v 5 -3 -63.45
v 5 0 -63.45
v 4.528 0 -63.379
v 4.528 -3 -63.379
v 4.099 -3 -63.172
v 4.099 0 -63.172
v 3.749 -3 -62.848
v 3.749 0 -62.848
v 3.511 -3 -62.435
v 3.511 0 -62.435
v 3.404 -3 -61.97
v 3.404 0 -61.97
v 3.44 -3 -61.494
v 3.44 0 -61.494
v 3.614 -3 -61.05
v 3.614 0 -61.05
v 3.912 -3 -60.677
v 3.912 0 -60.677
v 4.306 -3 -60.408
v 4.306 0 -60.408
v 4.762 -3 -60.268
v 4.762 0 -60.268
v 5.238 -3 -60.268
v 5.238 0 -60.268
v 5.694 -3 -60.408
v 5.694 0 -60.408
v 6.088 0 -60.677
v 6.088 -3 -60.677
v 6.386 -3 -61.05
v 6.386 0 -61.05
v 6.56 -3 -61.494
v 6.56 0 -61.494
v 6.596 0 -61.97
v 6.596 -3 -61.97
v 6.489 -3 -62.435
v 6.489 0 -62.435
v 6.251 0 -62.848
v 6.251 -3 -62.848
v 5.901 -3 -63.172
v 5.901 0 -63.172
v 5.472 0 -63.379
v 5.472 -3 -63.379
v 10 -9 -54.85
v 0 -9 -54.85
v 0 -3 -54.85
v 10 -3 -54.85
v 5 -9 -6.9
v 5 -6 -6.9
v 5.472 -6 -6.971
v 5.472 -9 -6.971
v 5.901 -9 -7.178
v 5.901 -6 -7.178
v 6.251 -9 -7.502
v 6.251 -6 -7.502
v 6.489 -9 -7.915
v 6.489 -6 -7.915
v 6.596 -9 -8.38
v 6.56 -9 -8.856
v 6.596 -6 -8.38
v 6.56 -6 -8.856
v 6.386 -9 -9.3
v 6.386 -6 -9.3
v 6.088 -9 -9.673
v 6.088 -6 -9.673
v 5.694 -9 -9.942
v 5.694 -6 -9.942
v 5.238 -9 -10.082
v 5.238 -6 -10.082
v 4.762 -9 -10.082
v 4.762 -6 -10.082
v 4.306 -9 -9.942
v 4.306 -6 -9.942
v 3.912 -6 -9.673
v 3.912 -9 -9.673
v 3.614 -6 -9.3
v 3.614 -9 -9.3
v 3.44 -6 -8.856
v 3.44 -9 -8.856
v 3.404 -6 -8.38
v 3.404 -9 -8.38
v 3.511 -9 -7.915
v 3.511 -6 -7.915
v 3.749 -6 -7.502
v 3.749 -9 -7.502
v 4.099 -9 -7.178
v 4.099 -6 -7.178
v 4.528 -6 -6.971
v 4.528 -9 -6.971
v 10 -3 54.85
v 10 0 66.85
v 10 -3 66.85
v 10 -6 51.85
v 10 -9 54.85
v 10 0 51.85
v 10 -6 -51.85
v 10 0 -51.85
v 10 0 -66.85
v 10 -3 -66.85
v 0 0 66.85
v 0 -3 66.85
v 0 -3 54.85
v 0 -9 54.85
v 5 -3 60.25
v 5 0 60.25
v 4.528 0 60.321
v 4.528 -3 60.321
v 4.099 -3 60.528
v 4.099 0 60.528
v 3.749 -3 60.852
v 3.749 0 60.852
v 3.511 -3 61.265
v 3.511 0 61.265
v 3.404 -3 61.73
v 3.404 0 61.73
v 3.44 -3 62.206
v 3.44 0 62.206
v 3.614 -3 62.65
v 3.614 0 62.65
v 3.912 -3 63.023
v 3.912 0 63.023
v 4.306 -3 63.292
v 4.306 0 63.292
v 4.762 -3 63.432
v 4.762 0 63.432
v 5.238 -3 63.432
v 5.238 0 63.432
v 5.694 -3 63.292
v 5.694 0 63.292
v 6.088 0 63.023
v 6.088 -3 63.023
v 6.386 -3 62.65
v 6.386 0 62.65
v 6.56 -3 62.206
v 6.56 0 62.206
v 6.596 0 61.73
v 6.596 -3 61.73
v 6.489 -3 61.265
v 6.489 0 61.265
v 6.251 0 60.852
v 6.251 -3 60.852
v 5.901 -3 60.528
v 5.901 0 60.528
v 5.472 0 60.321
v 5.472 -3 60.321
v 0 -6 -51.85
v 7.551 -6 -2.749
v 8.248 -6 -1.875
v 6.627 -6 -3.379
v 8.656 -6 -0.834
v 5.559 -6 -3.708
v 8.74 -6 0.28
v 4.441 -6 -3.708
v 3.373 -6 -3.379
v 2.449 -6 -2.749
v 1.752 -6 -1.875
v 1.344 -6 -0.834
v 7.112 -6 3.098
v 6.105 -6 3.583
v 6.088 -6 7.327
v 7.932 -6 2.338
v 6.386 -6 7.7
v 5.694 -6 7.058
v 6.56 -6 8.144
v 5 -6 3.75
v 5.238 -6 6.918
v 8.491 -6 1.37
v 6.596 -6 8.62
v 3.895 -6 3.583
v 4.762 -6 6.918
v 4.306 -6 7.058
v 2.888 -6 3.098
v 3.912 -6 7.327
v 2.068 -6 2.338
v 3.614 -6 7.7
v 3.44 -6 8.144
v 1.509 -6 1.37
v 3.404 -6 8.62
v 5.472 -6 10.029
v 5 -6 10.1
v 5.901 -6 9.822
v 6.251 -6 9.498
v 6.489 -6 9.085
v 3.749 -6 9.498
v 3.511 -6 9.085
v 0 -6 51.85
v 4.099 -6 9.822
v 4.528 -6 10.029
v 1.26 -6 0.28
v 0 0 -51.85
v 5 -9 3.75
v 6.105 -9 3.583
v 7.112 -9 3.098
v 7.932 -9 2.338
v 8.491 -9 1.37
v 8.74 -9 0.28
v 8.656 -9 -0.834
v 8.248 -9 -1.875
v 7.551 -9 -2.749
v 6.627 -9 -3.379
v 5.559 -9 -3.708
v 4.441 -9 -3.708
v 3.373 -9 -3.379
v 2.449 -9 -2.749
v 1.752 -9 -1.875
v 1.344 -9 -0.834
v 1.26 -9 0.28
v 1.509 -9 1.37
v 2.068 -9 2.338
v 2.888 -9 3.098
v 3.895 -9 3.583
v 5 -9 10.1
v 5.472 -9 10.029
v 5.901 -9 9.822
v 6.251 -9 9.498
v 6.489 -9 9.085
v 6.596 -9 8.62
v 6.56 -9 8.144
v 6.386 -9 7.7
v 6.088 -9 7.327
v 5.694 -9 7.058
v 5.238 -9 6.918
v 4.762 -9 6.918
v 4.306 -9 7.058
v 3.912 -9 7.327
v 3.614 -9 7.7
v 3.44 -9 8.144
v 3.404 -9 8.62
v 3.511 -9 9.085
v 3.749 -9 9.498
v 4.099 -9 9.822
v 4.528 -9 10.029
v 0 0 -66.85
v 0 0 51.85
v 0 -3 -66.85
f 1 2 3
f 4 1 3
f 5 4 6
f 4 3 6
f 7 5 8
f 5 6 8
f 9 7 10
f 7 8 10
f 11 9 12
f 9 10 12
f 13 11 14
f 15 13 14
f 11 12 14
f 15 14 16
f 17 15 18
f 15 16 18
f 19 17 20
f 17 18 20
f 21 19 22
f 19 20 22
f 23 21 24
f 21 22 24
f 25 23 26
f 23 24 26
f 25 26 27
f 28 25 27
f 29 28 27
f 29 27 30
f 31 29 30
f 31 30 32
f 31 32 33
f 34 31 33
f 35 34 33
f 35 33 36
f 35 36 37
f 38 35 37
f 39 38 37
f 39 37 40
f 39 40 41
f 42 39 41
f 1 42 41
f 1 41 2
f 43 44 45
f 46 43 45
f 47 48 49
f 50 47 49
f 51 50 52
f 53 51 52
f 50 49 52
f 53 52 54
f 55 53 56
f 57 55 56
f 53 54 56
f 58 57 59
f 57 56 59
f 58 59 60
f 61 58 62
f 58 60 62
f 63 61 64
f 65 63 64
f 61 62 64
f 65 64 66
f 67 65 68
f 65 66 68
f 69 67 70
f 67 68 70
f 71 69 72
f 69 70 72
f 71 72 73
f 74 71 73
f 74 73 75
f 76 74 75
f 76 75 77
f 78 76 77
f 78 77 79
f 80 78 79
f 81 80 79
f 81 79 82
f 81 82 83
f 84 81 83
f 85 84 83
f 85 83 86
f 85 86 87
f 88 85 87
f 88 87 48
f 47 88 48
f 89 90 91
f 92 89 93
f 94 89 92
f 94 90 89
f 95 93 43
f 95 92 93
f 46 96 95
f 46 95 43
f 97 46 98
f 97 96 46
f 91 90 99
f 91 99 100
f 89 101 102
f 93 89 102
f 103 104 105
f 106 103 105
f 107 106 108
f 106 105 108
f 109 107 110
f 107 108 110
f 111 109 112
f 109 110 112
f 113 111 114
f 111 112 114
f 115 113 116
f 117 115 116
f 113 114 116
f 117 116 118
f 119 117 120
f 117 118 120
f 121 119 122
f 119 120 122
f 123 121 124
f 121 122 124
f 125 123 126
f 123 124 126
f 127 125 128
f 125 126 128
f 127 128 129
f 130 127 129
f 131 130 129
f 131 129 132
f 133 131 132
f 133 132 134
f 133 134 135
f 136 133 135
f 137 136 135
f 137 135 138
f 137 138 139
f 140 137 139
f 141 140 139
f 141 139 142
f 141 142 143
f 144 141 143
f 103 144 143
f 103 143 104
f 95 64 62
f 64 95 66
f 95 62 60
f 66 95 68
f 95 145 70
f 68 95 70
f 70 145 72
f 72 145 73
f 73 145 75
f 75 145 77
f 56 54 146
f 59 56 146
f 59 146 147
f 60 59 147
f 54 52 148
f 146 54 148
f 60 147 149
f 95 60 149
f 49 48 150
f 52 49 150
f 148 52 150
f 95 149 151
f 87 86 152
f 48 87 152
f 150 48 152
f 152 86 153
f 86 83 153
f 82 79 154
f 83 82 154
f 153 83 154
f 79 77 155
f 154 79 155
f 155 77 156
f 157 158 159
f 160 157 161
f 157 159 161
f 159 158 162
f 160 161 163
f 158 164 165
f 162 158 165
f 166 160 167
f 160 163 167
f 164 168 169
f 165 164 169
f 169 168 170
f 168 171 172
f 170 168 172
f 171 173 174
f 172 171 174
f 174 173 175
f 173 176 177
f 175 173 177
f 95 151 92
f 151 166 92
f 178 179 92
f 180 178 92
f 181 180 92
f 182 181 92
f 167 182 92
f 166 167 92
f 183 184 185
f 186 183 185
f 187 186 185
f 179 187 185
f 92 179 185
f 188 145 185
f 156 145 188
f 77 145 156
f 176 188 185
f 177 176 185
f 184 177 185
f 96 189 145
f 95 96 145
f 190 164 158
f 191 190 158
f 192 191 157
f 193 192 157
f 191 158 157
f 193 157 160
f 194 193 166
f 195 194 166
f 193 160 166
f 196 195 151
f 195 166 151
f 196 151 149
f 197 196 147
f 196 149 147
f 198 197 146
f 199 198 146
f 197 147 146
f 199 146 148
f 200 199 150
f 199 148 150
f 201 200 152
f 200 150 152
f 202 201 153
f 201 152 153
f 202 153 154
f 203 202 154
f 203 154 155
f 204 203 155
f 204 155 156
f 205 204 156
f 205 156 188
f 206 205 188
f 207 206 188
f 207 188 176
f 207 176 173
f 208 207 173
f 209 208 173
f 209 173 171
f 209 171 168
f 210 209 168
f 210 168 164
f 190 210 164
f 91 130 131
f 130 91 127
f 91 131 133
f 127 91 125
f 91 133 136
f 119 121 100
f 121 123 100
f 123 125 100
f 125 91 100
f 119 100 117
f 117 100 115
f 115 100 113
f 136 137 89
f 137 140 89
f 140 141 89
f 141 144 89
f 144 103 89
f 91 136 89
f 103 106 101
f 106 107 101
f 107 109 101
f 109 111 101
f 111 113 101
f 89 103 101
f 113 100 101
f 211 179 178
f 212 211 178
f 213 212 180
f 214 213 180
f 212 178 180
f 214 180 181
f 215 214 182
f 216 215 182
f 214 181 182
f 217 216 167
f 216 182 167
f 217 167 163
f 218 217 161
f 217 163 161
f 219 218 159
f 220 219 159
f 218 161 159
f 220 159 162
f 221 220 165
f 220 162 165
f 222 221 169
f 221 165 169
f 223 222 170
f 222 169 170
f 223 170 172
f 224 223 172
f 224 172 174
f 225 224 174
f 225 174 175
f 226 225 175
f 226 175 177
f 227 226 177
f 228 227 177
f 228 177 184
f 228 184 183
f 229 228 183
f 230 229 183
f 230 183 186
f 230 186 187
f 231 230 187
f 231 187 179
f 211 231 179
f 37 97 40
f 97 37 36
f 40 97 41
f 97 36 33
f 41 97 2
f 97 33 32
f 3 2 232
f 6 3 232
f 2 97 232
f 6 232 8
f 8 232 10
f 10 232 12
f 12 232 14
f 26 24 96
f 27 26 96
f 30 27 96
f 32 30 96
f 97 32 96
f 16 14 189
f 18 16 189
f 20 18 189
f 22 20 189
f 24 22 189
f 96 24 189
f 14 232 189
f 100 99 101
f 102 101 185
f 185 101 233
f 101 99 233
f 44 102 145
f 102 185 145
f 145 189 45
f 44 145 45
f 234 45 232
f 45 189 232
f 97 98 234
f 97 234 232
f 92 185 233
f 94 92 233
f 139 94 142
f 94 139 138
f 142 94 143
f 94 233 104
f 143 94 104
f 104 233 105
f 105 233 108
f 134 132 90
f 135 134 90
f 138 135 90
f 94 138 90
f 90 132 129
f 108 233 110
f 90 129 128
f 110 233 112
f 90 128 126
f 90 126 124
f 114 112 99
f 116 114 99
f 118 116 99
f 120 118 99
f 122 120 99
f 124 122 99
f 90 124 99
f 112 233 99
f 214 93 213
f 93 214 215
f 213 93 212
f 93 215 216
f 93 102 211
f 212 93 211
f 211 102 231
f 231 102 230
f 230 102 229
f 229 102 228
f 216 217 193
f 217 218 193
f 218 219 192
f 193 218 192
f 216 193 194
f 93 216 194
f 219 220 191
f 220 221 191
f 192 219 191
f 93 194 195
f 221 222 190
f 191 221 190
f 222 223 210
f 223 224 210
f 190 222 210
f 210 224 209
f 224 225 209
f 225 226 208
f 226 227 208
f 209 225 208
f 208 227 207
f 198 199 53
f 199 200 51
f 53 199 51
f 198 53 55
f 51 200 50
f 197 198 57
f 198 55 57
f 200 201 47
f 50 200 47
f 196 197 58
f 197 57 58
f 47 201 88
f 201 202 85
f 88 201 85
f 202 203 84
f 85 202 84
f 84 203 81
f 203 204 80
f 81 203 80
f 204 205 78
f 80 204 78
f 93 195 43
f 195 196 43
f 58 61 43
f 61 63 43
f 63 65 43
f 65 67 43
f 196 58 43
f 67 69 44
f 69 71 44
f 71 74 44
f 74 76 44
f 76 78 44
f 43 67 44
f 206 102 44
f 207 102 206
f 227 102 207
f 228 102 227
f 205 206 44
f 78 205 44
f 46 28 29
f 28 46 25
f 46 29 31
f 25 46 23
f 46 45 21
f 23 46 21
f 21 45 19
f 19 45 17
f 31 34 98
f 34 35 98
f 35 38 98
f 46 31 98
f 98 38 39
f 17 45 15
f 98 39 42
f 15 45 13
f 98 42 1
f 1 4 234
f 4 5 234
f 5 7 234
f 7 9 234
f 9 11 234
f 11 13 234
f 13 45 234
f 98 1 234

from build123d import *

# Parameters (mm, degrees)
SALIENTE_EXTRUIR1_DEPTH = 10
CROQUIS2_R              = 1.6
CORTAR_EXTRUIR1_DEPTH   = 10
CORTAR_EXTRUIR2_START   = 10
CROQUIS2_2_R            = 1.6
CORTAR_EXTRUIR2_DEPTH   = 10
CROQUIS3_R              = 3.75
CORTAR_EXTRUIR3_DEPTH   = 10


with BuildPart() as part:
    # Croquis1 → Saliente-Extruir1 (new body)
    with BuildSketch(Plane(origin=(0, 0, 0), x_dir=(0, 0, -1), z_dir=(1, 0, 0))):
        Polygon((-61.85, 0), (-66.85, 0), (-66.85, -3), (-54.85, -3), (-54.85, -6), (-54.85, -9), (54.85, -9), (54.85, -6), (54.85, -3), (66.85, -3), (66.85, 0), (61.85, 0), (51.85, 0), (51.85, -6), (-51.85, -6), (-51.85, 0), align=None)
    extrude(amount=SALIENTE_EXTRUIR1_DEPTH)

    # Croquis2 → Cortar-Extruir1 (cut)
    with BuildSketch(Plane(origin=(0, -6, 0), x_dir=(1, 0, 0), z_dir=(0, 1, 0))):
        with Locations((5, -61.85)):
            Circle(CROQUIS2_R)
        with Locations((5, 61.85)):
            Circle(CROQUIS2_R)
        with Locations((5, -8.5)):
            Circle(CROQUIS2_R)
        with Locations((5, 8.5)):
            Circle(CROQUIS2_R)
    extrude(amount=-CORTAR_EXTRUIR1_DEPTH, mode=Mode.SUBTRACT)

    # Croquis2<2> → Cortar-Extruir2 (cut)
    with BuildSketch(Plane(origin=(0, -6, 0), x_dir=(1, 0, 0), z_dir=(0, 1, 0)).offset(CORTAR_EXTRUIR2_START)):
        with Locations((5, -61.85)):
            Circle(CROQUIS2_2_R)
        with Locations((5, 61.85)):
            Circle(CROQUIS2_2_R)
        with Locations((5, -8.5)):
            Circle(CROQUIS2_2_R)
        with Locations((5, 8.5)):
            Circle(CROQUIS2_2_R)
    extrude(amount=-CORTAR_EXTRUIR2_DEPTH, mode=Mode.SUBTRACT)

    # Croquis3 → Cortar-Extruir3 (cut)
    with BuildSketch(Plane(origin=(0, -6, 0), x_dir=(1, 0, 0), z_dir=(0, 1, 0))):
        with Locations((5, 0)):
            Circle(CROQUIS3_R)
    extrude(amount=-CORTAR_EXTRUIR3_DEPTH, mode=Mode.SUBTRACT)


solid = part.part
